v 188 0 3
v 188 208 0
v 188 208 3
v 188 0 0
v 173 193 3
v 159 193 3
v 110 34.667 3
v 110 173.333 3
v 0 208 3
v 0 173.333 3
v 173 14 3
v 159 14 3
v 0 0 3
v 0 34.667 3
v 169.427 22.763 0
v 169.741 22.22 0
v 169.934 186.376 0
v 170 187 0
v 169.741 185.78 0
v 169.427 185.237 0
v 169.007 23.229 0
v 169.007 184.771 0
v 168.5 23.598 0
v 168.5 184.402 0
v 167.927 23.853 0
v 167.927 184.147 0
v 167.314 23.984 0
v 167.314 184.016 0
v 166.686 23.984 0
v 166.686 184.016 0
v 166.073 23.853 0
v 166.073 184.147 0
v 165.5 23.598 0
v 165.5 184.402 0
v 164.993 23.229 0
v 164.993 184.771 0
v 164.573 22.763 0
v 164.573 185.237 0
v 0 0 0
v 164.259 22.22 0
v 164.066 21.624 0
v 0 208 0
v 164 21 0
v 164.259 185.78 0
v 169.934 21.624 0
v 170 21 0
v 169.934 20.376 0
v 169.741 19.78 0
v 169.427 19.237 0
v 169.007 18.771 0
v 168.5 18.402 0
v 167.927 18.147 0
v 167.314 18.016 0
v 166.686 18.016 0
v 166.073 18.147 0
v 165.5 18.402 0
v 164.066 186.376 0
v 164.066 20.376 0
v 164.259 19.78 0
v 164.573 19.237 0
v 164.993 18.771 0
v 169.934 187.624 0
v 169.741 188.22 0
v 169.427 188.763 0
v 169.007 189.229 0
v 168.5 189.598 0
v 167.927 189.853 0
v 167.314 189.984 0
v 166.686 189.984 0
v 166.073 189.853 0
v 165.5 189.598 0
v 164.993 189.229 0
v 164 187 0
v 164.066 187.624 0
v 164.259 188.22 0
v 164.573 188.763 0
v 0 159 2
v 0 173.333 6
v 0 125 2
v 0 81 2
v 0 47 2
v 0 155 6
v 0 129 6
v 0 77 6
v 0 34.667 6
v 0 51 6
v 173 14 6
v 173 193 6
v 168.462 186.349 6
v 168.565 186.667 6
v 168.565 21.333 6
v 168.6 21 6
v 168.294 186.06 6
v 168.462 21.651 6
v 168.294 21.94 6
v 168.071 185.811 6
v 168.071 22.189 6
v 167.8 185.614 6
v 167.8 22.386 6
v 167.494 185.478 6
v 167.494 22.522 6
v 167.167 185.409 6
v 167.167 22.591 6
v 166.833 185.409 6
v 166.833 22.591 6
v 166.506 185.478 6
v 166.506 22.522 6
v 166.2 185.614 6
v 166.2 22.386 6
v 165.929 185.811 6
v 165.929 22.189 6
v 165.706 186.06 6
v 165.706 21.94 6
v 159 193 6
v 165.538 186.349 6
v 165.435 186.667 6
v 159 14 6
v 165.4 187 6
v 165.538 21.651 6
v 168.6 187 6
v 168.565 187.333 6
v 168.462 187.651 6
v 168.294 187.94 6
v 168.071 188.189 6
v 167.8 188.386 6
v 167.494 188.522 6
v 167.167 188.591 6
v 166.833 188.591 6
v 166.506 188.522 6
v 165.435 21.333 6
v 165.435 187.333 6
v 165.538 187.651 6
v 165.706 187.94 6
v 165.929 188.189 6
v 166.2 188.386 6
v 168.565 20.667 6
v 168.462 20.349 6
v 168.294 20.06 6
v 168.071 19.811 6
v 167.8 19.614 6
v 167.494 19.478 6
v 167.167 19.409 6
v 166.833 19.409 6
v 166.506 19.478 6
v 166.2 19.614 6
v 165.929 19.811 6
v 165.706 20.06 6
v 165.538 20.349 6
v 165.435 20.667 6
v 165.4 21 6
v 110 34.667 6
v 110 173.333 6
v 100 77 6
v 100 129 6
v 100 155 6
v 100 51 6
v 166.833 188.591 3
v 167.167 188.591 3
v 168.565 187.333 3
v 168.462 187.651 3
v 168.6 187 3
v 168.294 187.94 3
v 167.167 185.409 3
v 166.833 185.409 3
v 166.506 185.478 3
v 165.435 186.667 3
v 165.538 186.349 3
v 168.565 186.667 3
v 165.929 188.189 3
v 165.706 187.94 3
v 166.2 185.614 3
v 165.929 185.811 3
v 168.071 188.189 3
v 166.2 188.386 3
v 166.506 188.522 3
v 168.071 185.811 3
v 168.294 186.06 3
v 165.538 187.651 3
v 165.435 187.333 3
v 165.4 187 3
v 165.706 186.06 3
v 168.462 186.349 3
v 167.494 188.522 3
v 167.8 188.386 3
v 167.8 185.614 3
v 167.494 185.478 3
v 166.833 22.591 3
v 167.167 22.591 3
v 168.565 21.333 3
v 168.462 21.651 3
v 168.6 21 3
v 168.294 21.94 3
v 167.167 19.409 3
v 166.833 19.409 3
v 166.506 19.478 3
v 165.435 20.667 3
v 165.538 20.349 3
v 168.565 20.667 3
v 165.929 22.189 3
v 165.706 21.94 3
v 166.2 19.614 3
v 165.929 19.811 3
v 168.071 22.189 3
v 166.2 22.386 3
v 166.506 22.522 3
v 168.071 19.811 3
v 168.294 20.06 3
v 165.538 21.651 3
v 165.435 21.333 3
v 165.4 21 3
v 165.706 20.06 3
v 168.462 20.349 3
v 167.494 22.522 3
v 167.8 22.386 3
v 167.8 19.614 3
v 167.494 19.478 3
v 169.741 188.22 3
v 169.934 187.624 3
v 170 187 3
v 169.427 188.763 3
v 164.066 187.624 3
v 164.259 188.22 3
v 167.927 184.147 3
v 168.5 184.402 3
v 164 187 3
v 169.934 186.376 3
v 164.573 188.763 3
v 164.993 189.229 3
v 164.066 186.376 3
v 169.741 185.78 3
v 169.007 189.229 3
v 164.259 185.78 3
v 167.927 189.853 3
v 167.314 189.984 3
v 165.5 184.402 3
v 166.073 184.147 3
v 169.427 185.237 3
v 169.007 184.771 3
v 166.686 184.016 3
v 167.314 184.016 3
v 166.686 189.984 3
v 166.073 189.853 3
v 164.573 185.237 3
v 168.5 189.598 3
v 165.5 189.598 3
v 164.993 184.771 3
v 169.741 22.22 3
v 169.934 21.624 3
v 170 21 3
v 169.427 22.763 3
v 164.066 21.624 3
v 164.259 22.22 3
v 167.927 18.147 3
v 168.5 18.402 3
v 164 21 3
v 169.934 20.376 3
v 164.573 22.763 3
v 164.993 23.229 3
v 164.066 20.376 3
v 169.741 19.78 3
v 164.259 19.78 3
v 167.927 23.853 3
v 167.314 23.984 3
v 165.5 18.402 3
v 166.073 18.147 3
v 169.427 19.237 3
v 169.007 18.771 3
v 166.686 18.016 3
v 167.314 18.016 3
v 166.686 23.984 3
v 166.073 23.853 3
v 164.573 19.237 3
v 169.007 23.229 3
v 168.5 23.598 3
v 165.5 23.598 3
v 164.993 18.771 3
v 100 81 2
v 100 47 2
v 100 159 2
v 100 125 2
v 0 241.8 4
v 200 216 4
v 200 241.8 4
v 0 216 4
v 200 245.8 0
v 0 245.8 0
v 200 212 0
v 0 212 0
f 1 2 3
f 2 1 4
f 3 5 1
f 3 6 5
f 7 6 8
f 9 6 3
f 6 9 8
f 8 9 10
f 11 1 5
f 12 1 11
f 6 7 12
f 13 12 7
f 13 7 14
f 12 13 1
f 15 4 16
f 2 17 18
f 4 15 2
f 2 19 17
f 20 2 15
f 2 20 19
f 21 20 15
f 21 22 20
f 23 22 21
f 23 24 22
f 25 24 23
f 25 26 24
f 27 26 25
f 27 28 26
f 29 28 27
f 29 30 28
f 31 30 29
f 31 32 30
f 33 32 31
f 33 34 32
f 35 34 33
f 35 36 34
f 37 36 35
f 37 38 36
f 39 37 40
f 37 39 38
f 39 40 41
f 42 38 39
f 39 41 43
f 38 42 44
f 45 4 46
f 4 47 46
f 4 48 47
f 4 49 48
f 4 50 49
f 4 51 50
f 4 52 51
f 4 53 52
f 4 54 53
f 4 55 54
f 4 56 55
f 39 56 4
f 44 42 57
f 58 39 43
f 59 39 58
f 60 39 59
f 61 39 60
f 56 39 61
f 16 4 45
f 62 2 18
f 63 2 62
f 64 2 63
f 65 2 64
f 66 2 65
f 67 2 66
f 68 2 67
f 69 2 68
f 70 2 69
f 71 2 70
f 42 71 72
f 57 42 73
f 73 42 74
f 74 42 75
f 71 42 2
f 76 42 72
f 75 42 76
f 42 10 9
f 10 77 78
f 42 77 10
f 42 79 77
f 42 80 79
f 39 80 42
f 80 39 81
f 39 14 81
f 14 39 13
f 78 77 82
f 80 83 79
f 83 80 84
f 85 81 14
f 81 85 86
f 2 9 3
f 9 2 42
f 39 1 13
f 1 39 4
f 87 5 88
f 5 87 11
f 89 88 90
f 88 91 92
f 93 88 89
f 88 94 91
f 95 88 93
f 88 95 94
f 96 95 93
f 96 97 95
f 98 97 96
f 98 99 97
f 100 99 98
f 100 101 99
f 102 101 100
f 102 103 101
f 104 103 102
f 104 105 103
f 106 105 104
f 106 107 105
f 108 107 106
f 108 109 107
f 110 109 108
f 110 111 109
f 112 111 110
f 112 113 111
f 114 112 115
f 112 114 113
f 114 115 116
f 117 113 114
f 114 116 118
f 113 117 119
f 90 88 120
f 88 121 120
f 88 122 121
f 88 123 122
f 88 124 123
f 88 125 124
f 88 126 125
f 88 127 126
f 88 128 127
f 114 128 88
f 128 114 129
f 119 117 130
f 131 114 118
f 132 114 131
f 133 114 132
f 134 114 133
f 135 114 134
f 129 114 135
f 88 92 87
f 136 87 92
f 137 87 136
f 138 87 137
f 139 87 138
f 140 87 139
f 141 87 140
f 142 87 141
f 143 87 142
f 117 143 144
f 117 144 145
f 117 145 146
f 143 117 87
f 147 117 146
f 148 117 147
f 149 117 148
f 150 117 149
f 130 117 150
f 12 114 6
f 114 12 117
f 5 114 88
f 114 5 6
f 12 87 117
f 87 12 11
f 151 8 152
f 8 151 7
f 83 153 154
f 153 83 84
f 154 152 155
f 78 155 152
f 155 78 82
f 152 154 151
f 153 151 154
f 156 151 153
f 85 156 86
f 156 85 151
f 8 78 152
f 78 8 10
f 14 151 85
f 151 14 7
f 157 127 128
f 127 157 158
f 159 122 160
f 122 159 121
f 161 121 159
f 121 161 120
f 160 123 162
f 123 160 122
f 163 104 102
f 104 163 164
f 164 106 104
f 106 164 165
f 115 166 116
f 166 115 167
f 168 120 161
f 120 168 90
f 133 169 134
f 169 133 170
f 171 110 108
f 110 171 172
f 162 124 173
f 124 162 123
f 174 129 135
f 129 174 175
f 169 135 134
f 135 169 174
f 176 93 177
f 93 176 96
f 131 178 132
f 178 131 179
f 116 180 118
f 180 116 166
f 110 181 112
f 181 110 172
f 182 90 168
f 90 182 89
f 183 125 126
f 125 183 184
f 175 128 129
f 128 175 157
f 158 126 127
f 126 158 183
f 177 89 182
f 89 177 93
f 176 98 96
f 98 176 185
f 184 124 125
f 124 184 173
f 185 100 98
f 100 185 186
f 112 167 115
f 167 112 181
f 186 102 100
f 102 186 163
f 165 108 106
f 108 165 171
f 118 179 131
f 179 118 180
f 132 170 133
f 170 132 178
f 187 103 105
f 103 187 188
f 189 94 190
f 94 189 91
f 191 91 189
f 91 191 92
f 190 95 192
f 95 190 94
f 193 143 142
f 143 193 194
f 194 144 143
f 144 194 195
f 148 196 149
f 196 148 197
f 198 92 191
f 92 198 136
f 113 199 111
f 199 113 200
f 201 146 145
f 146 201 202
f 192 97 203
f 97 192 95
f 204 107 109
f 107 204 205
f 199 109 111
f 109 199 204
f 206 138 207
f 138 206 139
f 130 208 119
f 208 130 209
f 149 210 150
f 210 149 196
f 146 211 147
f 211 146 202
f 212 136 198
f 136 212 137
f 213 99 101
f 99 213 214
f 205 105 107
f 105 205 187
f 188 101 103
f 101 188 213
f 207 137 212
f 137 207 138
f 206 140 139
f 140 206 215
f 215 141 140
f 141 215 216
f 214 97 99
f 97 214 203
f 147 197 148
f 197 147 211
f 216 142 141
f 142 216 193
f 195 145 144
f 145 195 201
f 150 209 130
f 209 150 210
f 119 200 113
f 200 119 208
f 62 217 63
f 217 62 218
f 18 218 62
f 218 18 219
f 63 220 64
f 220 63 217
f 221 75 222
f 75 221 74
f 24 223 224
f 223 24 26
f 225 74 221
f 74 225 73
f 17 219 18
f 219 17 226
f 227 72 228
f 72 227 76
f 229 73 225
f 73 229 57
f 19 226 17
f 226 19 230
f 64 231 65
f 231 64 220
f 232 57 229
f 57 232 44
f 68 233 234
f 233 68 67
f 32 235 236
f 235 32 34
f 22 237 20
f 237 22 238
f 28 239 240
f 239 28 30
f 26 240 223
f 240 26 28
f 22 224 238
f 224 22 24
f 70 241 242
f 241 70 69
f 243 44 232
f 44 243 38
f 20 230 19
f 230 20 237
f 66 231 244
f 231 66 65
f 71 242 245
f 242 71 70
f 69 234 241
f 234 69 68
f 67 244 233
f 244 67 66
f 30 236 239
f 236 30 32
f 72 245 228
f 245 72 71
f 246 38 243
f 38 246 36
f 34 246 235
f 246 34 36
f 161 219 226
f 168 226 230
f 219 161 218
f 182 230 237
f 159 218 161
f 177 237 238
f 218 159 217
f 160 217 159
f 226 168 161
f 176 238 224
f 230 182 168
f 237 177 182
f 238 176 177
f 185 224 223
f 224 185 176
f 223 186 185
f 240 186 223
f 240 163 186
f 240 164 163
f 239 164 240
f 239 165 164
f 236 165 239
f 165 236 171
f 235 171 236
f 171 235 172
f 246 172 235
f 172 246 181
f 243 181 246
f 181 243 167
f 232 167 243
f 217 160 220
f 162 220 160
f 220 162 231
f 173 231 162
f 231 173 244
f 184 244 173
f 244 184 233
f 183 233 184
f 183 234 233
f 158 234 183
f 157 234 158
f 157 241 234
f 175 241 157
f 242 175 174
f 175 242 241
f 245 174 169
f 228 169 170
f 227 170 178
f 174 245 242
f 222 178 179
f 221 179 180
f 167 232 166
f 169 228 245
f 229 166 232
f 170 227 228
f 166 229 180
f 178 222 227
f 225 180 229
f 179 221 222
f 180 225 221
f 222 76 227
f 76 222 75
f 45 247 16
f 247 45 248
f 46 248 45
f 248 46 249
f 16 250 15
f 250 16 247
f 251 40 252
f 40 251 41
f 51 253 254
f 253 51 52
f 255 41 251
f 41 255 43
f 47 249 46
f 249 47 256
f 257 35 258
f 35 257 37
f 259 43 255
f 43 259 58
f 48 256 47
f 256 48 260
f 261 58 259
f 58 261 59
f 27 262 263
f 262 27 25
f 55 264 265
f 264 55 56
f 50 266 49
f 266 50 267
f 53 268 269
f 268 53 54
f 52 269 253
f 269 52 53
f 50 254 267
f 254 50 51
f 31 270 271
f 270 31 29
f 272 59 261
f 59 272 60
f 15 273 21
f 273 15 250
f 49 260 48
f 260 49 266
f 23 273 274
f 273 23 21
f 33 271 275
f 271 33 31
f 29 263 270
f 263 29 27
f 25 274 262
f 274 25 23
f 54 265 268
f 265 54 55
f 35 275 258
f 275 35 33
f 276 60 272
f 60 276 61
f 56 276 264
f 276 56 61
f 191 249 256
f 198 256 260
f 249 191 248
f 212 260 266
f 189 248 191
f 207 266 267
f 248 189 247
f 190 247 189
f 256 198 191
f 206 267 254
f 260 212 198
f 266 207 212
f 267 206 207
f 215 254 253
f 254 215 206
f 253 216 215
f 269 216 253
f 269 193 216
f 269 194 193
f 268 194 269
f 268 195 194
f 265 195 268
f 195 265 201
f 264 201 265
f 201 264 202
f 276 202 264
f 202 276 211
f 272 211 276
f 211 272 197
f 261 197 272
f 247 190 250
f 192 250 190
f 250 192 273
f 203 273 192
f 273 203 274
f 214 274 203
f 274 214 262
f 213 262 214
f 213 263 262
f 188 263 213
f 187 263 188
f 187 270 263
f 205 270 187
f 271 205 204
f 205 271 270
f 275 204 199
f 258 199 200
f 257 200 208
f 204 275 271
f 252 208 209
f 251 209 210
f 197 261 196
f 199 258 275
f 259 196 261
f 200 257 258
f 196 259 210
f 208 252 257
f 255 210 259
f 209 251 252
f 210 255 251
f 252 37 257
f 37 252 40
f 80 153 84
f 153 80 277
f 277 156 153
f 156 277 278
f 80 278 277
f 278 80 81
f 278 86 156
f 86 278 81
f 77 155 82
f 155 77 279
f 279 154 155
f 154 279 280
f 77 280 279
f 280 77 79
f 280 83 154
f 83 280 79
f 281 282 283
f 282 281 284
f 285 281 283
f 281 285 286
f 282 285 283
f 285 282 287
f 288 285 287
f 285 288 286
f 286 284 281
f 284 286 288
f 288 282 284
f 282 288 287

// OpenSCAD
// file: wedge.scad
module wedge(width = 60) {
    rotate([270, 0, 90]) translate([32, -8, -100]) linear_extrude(height=200)
    polygon(points=[[4, 0], [width, 0], [width + 4, 4], [0, 4]]);
}
// main file
use <wedge.scad>;

width = 150;
height = 188;

module side_panel() {
    difference() {
        union() {
            cube([height, width + 58, 3]);
            color("Blue") translate([height - 29, 14, 0]) cube([14, width + 29, 6]);
            translate([0, (width + 58) / 6, 0]) cube([110, (width + 58) / 1.5, 6]);
        }
        translate([height - 21, width + 37, 0]) cylinder(h = 7, r = 1.6, $fn = 30);
        translate([height - 21, 21, 0]) cylinder(h = 7, r = 1.6, $fn = 30);

        translate([height - 21, width + 37, 0]) cylinder(h = 3, r = 3, $fn = 30);
        translate([height - 21, 21, 0]) cylinder(h = 3, r = 3, $fn = 30);

        translate([0, 15, -2]) wedge(width = 30);
        translate([0, 93, -2]) wedge(width = 30);
    }
}

side_panel();

translate([100, width + 30, -4]) color("Green") wedge(width = 29.8);
